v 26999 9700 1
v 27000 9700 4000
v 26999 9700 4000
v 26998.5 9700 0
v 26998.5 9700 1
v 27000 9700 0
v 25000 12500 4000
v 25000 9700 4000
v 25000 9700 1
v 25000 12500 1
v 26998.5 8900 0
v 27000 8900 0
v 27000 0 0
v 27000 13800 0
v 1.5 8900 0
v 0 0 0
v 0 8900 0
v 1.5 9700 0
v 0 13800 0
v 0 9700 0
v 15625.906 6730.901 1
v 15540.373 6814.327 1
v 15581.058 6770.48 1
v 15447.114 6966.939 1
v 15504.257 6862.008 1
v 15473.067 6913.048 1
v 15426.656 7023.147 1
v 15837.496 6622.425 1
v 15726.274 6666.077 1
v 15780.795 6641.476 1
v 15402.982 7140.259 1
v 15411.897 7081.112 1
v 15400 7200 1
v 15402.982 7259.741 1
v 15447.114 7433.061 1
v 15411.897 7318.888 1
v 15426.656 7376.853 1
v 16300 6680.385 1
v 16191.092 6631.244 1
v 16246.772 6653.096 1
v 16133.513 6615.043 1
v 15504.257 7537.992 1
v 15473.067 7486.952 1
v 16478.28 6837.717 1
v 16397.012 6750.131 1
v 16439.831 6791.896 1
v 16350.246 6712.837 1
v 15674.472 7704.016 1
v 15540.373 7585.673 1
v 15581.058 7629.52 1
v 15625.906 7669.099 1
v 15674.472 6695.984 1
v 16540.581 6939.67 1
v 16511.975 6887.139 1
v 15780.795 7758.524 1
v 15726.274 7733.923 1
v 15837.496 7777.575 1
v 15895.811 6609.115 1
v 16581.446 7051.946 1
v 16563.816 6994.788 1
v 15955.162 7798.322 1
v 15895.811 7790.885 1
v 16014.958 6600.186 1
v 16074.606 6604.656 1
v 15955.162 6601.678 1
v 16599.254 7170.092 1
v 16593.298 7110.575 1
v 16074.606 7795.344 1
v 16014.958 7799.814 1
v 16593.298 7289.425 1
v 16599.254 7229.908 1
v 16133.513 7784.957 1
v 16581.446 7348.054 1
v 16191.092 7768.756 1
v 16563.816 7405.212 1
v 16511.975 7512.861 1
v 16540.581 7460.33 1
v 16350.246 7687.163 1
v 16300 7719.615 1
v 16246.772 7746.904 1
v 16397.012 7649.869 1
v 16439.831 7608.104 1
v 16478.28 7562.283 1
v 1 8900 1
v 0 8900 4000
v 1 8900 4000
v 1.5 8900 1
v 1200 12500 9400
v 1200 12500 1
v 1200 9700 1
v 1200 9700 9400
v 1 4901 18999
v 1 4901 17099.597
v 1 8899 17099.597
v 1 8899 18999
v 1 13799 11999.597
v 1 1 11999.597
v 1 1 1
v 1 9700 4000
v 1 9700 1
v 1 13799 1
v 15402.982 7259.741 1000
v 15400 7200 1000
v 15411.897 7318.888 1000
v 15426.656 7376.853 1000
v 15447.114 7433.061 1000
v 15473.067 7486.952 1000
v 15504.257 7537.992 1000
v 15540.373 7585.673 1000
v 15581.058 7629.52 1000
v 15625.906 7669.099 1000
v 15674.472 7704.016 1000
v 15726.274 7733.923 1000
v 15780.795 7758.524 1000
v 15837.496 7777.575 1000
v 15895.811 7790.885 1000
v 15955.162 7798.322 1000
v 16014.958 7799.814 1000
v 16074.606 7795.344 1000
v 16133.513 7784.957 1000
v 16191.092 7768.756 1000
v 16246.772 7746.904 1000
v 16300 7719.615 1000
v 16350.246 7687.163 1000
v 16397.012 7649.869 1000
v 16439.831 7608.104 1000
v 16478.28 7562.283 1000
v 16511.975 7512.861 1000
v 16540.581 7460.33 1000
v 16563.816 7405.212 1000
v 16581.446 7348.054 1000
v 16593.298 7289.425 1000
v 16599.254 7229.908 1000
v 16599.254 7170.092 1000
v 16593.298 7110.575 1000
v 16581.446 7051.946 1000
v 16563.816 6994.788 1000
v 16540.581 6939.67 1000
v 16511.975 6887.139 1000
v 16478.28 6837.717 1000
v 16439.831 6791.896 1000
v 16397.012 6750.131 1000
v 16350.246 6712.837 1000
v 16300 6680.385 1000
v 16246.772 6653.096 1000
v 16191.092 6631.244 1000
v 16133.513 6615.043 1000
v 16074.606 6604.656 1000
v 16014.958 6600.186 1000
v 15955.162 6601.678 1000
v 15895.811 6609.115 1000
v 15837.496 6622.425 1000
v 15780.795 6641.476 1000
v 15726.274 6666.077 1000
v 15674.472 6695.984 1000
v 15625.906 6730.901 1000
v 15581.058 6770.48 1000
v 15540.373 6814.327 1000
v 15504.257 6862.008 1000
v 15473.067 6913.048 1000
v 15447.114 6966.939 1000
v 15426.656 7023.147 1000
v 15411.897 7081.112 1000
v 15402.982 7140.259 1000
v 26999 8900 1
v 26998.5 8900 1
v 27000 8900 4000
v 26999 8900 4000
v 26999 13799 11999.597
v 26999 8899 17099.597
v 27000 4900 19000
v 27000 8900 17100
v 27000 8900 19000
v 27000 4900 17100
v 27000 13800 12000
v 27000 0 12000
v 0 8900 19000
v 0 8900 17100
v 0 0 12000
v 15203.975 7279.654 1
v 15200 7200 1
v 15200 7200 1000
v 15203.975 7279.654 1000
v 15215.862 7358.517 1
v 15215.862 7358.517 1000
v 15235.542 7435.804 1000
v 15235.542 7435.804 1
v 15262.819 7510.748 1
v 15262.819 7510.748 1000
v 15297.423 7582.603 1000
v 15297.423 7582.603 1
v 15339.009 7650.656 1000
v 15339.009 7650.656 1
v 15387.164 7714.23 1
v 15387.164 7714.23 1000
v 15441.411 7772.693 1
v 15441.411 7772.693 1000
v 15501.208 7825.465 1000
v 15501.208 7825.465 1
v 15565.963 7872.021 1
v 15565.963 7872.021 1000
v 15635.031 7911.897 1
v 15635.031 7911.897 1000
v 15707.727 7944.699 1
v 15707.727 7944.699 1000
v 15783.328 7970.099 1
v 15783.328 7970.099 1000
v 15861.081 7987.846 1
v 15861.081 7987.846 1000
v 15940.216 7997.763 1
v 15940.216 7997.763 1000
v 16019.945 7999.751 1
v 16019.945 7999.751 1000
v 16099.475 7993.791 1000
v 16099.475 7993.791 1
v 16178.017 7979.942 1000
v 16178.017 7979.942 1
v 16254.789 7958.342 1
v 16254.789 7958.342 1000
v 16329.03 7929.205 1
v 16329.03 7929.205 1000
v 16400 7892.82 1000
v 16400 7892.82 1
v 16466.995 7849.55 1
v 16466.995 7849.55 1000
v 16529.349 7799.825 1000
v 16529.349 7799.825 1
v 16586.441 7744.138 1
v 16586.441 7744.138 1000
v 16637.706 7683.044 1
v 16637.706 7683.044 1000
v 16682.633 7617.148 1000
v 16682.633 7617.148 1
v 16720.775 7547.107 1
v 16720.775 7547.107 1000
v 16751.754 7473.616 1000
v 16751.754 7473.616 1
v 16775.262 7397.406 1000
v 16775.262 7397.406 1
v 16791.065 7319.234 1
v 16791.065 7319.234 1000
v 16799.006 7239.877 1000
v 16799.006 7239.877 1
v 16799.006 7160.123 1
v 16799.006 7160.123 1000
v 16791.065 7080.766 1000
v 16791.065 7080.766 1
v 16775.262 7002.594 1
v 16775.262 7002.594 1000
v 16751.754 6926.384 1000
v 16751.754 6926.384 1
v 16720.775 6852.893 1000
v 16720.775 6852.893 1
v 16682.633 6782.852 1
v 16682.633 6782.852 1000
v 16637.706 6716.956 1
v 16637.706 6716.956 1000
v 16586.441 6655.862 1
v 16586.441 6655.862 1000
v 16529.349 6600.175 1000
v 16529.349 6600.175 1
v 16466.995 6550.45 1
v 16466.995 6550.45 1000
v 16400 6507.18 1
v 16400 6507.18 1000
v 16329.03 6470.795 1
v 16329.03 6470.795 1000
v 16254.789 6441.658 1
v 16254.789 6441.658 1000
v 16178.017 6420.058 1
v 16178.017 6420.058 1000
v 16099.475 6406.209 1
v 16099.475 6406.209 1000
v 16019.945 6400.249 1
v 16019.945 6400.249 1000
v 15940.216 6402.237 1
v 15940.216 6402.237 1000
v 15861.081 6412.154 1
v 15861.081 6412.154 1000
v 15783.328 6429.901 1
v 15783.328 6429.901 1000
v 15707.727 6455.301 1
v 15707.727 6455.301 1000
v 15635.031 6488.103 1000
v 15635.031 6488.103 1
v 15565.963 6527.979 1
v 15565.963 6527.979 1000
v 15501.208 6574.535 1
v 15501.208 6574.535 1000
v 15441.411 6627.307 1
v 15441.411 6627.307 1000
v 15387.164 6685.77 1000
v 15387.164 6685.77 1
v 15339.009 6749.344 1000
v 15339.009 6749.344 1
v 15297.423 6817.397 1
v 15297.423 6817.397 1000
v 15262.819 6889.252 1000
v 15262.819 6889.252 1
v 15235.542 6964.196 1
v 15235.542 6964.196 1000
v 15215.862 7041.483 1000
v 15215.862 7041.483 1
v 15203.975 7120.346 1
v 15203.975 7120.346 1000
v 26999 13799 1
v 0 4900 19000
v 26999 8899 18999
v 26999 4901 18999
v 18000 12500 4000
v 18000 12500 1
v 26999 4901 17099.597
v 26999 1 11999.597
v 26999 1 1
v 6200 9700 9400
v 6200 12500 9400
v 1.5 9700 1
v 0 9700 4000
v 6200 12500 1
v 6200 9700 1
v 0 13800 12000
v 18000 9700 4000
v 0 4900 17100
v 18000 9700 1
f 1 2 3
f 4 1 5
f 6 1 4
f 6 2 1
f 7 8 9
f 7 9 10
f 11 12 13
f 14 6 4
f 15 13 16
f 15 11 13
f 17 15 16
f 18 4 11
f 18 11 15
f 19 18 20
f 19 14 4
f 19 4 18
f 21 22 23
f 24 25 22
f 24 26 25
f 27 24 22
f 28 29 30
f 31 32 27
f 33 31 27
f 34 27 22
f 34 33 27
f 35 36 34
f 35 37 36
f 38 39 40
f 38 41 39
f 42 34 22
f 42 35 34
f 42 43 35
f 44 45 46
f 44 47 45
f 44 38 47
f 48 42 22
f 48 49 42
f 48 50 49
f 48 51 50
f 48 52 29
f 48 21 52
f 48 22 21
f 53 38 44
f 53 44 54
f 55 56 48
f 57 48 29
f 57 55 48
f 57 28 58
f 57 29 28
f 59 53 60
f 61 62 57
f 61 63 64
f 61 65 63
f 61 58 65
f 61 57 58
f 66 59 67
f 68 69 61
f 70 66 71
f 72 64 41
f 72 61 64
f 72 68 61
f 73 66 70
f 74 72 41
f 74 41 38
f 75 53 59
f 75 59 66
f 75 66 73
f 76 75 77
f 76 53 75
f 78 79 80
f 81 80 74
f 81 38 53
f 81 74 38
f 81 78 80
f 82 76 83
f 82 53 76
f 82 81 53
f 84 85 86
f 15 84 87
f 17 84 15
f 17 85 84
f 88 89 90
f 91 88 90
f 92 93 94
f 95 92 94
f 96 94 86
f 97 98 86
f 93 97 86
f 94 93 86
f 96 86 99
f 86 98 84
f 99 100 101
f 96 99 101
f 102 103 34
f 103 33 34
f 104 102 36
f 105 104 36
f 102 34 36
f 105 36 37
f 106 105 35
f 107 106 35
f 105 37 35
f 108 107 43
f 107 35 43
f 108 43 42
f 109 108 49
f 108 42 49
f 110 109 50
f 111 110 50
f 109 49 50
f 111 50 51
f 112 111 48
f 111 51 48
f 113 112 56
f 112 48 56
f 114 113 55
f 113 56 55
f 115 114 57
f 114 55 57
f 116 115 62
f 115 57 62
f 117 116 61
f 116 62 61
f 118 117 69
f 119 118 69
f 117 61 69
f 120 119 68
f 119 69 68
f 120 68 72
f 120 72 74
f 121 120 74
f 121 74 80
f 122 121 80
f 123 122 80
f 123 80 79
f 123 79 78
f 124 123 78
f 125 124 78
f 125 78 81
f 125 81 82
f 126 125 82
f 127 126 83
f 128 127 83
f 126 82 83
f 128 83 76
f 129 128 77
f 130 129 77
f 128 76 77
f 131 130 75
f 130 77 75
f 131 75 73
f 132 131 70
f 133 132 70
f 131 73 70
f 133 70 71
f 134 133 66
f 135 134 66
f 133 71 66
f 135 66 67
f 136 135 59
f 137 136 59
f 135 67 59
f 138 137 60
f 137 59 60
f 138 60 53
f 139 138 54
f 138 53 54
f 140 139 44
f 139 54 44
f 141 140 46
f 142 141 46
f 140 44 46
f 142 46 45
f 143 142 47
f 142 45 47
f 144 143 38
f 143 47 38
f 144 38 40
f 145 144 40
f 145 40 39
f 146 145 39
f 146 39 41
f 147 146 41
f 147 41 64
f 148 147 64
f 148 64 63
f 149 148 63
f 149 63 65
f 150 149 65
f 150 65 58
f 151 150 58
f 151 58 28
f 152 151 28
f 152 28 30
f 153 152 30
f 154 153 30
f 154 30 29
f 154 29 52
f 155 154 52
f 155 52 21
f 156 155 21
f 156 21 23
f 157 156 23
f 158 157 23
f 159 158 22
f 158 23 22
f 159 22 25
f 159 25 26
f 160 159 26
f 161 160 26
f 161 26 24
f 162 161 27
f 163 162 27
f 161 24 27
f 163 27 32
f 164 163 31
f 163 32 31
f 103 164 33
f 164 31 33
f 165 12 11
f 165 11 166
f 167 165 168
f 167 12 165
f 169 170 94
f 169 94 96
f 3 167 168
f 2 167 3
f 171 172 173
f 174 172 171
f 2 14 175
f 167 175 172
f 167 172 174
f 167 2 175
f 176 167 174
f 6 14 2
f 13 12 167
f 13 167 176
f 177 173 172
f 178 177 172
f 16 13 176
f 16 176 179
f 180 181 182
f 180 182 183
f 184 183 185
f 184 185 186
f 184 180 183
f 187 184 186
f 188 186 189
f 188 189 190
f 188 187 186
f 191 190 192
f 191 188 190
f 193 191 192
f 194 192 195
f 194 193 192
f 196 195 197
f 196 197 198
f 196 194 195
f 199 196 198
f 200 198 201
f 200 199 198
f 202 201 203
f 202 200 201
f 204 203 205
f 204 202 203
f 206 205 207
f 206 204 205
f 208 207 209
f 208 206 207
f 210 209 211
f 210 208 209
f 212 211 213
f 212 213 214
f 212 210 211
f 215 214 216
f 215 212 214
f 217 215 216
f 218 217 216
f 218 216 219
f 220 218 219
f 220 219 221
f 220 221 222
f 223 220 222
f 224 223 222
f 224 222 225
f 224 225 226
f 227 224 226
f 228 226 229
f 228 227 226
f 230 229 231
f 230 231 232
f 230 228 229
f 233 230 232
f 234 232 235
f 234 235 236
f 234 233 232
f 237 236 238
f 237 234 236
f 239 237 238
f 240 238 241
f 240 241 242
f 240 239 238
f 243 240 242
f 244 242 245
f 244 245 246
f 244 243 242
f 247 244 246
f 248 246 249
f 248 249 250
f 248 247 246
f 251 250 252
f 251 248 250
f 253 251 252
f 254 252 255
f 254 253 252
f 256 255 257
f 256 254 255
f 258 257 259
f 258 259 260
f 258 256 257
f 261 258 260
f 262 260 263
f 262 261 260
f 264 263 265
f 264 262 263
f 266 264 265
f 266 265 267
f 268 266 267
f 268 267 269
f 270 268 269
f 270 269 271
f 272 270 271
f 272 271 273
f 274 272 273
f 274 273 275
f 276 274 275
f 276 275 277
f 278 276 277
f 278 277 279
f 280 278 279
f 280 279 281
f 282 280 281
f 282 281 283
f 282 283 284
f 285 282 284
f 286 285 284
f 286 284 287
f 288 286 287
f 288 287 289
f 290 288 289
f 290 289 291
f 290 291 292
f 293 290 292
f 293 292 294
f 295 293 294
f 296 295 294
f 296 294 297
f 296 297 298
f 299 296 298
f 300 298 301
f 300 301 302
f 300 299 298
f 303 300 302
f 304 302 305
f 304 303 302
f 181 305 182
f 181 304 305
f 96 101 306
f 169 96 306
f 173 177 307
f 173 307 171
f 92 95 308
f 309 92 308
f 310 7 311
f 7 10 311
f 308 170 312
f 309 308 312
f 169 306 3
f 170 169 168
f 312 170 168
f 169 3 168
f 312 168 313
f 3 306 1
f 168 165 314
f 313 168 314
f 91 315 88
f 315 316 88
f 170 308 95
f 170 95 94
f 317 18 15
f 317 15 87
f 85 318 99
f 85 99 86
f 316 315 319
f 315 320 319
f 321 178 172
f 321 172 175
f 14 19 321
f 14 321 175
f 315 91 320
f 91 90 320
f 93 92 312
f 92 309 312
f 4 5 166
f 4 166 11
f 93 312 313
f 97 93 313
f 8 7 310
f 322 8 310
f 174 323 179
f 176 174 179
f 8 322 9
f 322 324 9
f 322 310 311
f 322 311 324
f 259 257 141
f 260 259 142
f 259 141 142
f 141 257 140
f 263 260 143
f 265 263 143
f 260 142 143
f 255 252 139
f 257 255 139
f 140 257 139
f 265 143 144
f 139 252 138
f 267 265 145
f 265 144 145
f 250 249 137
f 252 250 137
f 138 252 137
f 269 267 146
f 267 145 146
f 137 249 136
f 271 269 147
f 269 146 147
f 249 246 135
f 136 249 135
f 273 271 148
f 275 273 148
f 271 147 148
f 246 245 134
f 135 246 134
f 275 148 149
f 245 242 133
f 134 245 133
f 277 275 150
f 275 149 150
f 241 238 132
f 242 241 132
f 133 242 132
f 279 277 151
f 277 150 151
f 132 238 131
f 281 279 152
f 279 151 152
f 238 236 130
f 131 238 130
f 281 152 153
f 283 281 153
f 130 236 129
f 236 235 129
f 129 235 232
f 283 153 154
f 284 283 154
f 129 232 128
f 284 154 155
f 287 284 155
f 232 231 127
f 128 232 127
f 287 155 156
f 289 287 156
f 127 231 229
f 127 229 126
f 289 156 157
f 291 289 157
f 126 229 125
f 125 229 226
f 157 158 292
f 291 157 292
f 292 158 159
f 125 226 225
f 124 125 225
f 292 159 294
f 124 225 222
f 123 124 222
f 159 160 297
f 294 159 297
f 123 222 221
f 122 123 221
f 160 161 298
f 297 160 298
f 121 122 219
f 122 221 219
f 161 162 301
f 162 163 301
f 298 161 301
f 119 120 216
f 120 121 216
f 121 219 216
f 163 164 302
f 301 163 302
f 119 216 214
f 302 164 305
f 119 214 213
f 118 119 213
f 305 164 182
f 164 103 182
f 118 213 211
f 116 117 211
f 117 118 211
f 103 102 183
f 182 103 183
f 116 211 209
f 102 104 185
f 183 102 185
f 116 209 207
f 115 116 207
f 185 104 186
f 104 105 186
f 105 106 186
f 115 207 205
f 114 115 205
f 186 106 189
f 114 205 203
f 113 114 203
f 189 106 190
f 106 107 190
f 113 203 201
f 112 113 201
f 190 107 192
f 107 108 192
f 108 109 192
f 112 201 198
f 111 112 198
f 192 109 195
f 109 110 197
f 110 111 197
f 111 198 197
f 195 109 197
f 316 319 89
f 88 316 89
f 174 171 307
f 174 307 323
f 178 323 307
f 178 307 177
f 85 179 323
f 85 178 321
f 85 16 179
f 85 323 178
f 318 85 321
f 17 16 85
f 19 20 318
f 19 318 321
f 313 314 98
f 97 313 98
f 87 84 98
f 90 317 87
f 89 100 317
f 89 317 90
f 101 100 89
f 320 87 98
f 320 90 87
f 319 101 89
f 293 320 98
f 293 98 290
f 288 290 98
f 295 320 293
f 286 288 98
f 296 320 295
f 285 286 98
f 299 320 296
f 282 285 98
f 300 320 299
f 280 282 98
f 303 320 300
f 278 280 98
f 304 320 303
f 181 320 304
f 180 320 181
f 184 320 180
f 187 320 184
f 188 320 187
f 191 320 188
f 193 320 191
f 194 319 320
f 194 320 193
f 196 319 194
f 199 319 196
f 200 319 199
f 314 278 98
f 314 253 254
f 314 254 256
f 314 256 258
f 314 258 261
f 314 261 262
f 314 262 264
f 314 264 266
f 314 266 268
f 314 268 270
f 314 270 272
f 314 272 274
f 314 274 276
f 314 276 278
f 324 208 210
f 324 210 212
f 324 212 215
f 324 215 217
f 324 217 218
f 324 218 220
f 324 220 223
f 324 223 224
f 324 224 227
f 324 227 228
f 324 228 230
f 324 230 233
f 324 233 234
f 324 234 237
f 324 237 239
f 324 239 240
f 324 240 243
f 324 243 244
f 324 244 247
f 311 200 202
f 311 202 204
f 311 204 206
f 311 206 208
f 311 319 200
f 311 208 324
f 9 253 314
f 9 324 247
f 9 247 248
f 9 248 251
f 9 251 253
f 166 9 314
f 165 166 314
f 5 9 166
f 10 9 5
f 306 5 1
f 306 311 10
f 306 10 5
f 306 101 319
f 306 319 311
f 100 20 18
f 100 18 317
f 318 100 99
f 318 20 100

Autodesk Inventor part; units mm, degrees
ref_plane "YZ Plane" through (0, 0, 0) normal (1, 0, 0) x (0, 1, 0)
ref_plane "XZ Plane" through (0, 0, 0) normal (0, 1, 0) x (-1, 0, 0)
ref_plane "XY Plane" through (0, 0, 0) normal (0, 0, 1) x (1, 0, 0)
sketch "Sketch1" plane through (0, 0, 0) normal (0, 0, 1) x (1, 0, 0)
  line L0 (0, 13800) -> (27000, 13800)
  line L1 (27000, 13800) -> (27000, 0)
  line L2 (27000, 0) -> (0, 0)
  line L3 (0, 0) -> (0, 13800)
  dimension "d0" = 13800
  dimension "d1" = 27000
extrude "Extrusion1" add sketch "Sketch1" along normal blind 19000
sketch "Sketch2" plane through (27000, 0, 0) normal (1, 0, 0) x (0, 0, -1)
  line L0 (-19000, 13800) -> (-19000, 0) projected
  line L1 (0, 0) -> (-19000, 0) projected
  line L2 (0, 13800) -> (0, 0) projected
  line L3 (0, 13800) -> (-19000, 13800) projected
  line L4 (-4000, 9700) -> (0, 9700)
  line L5 (0, 9700) -> (0, 8900)
  line L6 (0, 8900) -> (-4000, 8900)
  line L7 (-4000, 8900) -> (-4000, 9700)
  line L8 (-19000, 8900) -> (-17100, 8900)
  line L9 (-17100, 8900) -> (-12000, 13800)
  line L10 (-19000, 4900) -> (-17100, 4900)
  line L11 (-17100, 4900) -> (-12000, 0)
  dimension "d4" = 4000
  dimension "d5" = 800
  dimension "d6" = 8900
  dimension "d7" = 4900
  dimension "d9" = 12000
  dimension "d11" = 1900
  dimension "d13" = 1900
  dimension "d14" = 4900
  dimension "d15" = 12000
extrude "Extrusion2" cut sketch "Sketch2" against normal through all contours L3 L9 L8 L0
extrude "Extrusion3" cut sketch "Sketch2" against normal through all contours L10 L11 L1 L0
sketch "Sketch3" plane through (0, 0, 0) normal (-1, 0, 0) x (0, 0, 1)
  line L0 (0, 0) -> (0, 13800) projected
  line L1 (0, 0) -> (12000, 0) projected
  line L2 (0, 9700) -> (4000, 9700)
  line L3 (4000, 9700) -> (4000, 8900)
  line L4 (4000, 8900) -> (0, 8900)
  line L5 (0, 8900) -> (0, 9700)
  dimension "d20" = 4000
  dimension "d21" = 800
  dimension "d22" = 8900
shell "Shell1" thickness 1 removed faces 0
extrude "Extrusion4" cut sketch "Sketch2" against normal mid plane 3 contours L2 L6 L7 L4
extrude "Extrusion5" cut sketch "Sketch3" against normal mid plane 3
sketch "Sketch4" plane through (0, 0, 0) normal (0, 0, -1) x (-1, 0, 0)
  line L0 (0, 9700) -> (0, 13800) projected
  line L1 (-27000, 0) -> (0, 0) projected
  line L2 (0, 0) -> (0, 8900) projected
  line L3 (-25000, 12500) -> (-18000, 12500)
  line L4 (-18000, 12500) -> (-18000, 9700)
  line L5 (-18000, 9700) -> (-25000, 9700)
  line L6 (-25000, 9700) -> (-25000, 12500)
  line L7 (-6200, 12500) -> (-1200, 12500)
  line L8 (-1200, 12500) -> (-1200, 9700)
  line L9 (-1200, 9700) -> (-6200, 9700)
  line L10 (-6200, 9700) -> (-6200, 12500)
  circle A0 centre (-16000, 7200) radius 600
  circle A1 centre (-16000, 7200) radius 800
  dimension "d28" = 2800
  dimension "d29" = 7000
  dimension "d30" = 18000
  dimension "d31" = 9700
  dimension "d32" = 5000
  dimension "d33" = 2800
  dimension "d34" = 1200
  dimension "d35" = 9700
  dimension "d36" = 1200
  dimension "d37" = 7200
  dimension "d38" = 16000
  dimension "d39" = 1600
extrude "Extrusion6" add sketch "Sketch4" against normal blind 9400 contours L7 L8 L9 L10
extrude "Extrusion7" add sketch "Sketch4" against normal blind 4000 contours L3 L4 L5 L6
extrude "Extrusion8" add sketch "Sketch4" against normal blind 1000 contours A1
properties part number "BE 2"
